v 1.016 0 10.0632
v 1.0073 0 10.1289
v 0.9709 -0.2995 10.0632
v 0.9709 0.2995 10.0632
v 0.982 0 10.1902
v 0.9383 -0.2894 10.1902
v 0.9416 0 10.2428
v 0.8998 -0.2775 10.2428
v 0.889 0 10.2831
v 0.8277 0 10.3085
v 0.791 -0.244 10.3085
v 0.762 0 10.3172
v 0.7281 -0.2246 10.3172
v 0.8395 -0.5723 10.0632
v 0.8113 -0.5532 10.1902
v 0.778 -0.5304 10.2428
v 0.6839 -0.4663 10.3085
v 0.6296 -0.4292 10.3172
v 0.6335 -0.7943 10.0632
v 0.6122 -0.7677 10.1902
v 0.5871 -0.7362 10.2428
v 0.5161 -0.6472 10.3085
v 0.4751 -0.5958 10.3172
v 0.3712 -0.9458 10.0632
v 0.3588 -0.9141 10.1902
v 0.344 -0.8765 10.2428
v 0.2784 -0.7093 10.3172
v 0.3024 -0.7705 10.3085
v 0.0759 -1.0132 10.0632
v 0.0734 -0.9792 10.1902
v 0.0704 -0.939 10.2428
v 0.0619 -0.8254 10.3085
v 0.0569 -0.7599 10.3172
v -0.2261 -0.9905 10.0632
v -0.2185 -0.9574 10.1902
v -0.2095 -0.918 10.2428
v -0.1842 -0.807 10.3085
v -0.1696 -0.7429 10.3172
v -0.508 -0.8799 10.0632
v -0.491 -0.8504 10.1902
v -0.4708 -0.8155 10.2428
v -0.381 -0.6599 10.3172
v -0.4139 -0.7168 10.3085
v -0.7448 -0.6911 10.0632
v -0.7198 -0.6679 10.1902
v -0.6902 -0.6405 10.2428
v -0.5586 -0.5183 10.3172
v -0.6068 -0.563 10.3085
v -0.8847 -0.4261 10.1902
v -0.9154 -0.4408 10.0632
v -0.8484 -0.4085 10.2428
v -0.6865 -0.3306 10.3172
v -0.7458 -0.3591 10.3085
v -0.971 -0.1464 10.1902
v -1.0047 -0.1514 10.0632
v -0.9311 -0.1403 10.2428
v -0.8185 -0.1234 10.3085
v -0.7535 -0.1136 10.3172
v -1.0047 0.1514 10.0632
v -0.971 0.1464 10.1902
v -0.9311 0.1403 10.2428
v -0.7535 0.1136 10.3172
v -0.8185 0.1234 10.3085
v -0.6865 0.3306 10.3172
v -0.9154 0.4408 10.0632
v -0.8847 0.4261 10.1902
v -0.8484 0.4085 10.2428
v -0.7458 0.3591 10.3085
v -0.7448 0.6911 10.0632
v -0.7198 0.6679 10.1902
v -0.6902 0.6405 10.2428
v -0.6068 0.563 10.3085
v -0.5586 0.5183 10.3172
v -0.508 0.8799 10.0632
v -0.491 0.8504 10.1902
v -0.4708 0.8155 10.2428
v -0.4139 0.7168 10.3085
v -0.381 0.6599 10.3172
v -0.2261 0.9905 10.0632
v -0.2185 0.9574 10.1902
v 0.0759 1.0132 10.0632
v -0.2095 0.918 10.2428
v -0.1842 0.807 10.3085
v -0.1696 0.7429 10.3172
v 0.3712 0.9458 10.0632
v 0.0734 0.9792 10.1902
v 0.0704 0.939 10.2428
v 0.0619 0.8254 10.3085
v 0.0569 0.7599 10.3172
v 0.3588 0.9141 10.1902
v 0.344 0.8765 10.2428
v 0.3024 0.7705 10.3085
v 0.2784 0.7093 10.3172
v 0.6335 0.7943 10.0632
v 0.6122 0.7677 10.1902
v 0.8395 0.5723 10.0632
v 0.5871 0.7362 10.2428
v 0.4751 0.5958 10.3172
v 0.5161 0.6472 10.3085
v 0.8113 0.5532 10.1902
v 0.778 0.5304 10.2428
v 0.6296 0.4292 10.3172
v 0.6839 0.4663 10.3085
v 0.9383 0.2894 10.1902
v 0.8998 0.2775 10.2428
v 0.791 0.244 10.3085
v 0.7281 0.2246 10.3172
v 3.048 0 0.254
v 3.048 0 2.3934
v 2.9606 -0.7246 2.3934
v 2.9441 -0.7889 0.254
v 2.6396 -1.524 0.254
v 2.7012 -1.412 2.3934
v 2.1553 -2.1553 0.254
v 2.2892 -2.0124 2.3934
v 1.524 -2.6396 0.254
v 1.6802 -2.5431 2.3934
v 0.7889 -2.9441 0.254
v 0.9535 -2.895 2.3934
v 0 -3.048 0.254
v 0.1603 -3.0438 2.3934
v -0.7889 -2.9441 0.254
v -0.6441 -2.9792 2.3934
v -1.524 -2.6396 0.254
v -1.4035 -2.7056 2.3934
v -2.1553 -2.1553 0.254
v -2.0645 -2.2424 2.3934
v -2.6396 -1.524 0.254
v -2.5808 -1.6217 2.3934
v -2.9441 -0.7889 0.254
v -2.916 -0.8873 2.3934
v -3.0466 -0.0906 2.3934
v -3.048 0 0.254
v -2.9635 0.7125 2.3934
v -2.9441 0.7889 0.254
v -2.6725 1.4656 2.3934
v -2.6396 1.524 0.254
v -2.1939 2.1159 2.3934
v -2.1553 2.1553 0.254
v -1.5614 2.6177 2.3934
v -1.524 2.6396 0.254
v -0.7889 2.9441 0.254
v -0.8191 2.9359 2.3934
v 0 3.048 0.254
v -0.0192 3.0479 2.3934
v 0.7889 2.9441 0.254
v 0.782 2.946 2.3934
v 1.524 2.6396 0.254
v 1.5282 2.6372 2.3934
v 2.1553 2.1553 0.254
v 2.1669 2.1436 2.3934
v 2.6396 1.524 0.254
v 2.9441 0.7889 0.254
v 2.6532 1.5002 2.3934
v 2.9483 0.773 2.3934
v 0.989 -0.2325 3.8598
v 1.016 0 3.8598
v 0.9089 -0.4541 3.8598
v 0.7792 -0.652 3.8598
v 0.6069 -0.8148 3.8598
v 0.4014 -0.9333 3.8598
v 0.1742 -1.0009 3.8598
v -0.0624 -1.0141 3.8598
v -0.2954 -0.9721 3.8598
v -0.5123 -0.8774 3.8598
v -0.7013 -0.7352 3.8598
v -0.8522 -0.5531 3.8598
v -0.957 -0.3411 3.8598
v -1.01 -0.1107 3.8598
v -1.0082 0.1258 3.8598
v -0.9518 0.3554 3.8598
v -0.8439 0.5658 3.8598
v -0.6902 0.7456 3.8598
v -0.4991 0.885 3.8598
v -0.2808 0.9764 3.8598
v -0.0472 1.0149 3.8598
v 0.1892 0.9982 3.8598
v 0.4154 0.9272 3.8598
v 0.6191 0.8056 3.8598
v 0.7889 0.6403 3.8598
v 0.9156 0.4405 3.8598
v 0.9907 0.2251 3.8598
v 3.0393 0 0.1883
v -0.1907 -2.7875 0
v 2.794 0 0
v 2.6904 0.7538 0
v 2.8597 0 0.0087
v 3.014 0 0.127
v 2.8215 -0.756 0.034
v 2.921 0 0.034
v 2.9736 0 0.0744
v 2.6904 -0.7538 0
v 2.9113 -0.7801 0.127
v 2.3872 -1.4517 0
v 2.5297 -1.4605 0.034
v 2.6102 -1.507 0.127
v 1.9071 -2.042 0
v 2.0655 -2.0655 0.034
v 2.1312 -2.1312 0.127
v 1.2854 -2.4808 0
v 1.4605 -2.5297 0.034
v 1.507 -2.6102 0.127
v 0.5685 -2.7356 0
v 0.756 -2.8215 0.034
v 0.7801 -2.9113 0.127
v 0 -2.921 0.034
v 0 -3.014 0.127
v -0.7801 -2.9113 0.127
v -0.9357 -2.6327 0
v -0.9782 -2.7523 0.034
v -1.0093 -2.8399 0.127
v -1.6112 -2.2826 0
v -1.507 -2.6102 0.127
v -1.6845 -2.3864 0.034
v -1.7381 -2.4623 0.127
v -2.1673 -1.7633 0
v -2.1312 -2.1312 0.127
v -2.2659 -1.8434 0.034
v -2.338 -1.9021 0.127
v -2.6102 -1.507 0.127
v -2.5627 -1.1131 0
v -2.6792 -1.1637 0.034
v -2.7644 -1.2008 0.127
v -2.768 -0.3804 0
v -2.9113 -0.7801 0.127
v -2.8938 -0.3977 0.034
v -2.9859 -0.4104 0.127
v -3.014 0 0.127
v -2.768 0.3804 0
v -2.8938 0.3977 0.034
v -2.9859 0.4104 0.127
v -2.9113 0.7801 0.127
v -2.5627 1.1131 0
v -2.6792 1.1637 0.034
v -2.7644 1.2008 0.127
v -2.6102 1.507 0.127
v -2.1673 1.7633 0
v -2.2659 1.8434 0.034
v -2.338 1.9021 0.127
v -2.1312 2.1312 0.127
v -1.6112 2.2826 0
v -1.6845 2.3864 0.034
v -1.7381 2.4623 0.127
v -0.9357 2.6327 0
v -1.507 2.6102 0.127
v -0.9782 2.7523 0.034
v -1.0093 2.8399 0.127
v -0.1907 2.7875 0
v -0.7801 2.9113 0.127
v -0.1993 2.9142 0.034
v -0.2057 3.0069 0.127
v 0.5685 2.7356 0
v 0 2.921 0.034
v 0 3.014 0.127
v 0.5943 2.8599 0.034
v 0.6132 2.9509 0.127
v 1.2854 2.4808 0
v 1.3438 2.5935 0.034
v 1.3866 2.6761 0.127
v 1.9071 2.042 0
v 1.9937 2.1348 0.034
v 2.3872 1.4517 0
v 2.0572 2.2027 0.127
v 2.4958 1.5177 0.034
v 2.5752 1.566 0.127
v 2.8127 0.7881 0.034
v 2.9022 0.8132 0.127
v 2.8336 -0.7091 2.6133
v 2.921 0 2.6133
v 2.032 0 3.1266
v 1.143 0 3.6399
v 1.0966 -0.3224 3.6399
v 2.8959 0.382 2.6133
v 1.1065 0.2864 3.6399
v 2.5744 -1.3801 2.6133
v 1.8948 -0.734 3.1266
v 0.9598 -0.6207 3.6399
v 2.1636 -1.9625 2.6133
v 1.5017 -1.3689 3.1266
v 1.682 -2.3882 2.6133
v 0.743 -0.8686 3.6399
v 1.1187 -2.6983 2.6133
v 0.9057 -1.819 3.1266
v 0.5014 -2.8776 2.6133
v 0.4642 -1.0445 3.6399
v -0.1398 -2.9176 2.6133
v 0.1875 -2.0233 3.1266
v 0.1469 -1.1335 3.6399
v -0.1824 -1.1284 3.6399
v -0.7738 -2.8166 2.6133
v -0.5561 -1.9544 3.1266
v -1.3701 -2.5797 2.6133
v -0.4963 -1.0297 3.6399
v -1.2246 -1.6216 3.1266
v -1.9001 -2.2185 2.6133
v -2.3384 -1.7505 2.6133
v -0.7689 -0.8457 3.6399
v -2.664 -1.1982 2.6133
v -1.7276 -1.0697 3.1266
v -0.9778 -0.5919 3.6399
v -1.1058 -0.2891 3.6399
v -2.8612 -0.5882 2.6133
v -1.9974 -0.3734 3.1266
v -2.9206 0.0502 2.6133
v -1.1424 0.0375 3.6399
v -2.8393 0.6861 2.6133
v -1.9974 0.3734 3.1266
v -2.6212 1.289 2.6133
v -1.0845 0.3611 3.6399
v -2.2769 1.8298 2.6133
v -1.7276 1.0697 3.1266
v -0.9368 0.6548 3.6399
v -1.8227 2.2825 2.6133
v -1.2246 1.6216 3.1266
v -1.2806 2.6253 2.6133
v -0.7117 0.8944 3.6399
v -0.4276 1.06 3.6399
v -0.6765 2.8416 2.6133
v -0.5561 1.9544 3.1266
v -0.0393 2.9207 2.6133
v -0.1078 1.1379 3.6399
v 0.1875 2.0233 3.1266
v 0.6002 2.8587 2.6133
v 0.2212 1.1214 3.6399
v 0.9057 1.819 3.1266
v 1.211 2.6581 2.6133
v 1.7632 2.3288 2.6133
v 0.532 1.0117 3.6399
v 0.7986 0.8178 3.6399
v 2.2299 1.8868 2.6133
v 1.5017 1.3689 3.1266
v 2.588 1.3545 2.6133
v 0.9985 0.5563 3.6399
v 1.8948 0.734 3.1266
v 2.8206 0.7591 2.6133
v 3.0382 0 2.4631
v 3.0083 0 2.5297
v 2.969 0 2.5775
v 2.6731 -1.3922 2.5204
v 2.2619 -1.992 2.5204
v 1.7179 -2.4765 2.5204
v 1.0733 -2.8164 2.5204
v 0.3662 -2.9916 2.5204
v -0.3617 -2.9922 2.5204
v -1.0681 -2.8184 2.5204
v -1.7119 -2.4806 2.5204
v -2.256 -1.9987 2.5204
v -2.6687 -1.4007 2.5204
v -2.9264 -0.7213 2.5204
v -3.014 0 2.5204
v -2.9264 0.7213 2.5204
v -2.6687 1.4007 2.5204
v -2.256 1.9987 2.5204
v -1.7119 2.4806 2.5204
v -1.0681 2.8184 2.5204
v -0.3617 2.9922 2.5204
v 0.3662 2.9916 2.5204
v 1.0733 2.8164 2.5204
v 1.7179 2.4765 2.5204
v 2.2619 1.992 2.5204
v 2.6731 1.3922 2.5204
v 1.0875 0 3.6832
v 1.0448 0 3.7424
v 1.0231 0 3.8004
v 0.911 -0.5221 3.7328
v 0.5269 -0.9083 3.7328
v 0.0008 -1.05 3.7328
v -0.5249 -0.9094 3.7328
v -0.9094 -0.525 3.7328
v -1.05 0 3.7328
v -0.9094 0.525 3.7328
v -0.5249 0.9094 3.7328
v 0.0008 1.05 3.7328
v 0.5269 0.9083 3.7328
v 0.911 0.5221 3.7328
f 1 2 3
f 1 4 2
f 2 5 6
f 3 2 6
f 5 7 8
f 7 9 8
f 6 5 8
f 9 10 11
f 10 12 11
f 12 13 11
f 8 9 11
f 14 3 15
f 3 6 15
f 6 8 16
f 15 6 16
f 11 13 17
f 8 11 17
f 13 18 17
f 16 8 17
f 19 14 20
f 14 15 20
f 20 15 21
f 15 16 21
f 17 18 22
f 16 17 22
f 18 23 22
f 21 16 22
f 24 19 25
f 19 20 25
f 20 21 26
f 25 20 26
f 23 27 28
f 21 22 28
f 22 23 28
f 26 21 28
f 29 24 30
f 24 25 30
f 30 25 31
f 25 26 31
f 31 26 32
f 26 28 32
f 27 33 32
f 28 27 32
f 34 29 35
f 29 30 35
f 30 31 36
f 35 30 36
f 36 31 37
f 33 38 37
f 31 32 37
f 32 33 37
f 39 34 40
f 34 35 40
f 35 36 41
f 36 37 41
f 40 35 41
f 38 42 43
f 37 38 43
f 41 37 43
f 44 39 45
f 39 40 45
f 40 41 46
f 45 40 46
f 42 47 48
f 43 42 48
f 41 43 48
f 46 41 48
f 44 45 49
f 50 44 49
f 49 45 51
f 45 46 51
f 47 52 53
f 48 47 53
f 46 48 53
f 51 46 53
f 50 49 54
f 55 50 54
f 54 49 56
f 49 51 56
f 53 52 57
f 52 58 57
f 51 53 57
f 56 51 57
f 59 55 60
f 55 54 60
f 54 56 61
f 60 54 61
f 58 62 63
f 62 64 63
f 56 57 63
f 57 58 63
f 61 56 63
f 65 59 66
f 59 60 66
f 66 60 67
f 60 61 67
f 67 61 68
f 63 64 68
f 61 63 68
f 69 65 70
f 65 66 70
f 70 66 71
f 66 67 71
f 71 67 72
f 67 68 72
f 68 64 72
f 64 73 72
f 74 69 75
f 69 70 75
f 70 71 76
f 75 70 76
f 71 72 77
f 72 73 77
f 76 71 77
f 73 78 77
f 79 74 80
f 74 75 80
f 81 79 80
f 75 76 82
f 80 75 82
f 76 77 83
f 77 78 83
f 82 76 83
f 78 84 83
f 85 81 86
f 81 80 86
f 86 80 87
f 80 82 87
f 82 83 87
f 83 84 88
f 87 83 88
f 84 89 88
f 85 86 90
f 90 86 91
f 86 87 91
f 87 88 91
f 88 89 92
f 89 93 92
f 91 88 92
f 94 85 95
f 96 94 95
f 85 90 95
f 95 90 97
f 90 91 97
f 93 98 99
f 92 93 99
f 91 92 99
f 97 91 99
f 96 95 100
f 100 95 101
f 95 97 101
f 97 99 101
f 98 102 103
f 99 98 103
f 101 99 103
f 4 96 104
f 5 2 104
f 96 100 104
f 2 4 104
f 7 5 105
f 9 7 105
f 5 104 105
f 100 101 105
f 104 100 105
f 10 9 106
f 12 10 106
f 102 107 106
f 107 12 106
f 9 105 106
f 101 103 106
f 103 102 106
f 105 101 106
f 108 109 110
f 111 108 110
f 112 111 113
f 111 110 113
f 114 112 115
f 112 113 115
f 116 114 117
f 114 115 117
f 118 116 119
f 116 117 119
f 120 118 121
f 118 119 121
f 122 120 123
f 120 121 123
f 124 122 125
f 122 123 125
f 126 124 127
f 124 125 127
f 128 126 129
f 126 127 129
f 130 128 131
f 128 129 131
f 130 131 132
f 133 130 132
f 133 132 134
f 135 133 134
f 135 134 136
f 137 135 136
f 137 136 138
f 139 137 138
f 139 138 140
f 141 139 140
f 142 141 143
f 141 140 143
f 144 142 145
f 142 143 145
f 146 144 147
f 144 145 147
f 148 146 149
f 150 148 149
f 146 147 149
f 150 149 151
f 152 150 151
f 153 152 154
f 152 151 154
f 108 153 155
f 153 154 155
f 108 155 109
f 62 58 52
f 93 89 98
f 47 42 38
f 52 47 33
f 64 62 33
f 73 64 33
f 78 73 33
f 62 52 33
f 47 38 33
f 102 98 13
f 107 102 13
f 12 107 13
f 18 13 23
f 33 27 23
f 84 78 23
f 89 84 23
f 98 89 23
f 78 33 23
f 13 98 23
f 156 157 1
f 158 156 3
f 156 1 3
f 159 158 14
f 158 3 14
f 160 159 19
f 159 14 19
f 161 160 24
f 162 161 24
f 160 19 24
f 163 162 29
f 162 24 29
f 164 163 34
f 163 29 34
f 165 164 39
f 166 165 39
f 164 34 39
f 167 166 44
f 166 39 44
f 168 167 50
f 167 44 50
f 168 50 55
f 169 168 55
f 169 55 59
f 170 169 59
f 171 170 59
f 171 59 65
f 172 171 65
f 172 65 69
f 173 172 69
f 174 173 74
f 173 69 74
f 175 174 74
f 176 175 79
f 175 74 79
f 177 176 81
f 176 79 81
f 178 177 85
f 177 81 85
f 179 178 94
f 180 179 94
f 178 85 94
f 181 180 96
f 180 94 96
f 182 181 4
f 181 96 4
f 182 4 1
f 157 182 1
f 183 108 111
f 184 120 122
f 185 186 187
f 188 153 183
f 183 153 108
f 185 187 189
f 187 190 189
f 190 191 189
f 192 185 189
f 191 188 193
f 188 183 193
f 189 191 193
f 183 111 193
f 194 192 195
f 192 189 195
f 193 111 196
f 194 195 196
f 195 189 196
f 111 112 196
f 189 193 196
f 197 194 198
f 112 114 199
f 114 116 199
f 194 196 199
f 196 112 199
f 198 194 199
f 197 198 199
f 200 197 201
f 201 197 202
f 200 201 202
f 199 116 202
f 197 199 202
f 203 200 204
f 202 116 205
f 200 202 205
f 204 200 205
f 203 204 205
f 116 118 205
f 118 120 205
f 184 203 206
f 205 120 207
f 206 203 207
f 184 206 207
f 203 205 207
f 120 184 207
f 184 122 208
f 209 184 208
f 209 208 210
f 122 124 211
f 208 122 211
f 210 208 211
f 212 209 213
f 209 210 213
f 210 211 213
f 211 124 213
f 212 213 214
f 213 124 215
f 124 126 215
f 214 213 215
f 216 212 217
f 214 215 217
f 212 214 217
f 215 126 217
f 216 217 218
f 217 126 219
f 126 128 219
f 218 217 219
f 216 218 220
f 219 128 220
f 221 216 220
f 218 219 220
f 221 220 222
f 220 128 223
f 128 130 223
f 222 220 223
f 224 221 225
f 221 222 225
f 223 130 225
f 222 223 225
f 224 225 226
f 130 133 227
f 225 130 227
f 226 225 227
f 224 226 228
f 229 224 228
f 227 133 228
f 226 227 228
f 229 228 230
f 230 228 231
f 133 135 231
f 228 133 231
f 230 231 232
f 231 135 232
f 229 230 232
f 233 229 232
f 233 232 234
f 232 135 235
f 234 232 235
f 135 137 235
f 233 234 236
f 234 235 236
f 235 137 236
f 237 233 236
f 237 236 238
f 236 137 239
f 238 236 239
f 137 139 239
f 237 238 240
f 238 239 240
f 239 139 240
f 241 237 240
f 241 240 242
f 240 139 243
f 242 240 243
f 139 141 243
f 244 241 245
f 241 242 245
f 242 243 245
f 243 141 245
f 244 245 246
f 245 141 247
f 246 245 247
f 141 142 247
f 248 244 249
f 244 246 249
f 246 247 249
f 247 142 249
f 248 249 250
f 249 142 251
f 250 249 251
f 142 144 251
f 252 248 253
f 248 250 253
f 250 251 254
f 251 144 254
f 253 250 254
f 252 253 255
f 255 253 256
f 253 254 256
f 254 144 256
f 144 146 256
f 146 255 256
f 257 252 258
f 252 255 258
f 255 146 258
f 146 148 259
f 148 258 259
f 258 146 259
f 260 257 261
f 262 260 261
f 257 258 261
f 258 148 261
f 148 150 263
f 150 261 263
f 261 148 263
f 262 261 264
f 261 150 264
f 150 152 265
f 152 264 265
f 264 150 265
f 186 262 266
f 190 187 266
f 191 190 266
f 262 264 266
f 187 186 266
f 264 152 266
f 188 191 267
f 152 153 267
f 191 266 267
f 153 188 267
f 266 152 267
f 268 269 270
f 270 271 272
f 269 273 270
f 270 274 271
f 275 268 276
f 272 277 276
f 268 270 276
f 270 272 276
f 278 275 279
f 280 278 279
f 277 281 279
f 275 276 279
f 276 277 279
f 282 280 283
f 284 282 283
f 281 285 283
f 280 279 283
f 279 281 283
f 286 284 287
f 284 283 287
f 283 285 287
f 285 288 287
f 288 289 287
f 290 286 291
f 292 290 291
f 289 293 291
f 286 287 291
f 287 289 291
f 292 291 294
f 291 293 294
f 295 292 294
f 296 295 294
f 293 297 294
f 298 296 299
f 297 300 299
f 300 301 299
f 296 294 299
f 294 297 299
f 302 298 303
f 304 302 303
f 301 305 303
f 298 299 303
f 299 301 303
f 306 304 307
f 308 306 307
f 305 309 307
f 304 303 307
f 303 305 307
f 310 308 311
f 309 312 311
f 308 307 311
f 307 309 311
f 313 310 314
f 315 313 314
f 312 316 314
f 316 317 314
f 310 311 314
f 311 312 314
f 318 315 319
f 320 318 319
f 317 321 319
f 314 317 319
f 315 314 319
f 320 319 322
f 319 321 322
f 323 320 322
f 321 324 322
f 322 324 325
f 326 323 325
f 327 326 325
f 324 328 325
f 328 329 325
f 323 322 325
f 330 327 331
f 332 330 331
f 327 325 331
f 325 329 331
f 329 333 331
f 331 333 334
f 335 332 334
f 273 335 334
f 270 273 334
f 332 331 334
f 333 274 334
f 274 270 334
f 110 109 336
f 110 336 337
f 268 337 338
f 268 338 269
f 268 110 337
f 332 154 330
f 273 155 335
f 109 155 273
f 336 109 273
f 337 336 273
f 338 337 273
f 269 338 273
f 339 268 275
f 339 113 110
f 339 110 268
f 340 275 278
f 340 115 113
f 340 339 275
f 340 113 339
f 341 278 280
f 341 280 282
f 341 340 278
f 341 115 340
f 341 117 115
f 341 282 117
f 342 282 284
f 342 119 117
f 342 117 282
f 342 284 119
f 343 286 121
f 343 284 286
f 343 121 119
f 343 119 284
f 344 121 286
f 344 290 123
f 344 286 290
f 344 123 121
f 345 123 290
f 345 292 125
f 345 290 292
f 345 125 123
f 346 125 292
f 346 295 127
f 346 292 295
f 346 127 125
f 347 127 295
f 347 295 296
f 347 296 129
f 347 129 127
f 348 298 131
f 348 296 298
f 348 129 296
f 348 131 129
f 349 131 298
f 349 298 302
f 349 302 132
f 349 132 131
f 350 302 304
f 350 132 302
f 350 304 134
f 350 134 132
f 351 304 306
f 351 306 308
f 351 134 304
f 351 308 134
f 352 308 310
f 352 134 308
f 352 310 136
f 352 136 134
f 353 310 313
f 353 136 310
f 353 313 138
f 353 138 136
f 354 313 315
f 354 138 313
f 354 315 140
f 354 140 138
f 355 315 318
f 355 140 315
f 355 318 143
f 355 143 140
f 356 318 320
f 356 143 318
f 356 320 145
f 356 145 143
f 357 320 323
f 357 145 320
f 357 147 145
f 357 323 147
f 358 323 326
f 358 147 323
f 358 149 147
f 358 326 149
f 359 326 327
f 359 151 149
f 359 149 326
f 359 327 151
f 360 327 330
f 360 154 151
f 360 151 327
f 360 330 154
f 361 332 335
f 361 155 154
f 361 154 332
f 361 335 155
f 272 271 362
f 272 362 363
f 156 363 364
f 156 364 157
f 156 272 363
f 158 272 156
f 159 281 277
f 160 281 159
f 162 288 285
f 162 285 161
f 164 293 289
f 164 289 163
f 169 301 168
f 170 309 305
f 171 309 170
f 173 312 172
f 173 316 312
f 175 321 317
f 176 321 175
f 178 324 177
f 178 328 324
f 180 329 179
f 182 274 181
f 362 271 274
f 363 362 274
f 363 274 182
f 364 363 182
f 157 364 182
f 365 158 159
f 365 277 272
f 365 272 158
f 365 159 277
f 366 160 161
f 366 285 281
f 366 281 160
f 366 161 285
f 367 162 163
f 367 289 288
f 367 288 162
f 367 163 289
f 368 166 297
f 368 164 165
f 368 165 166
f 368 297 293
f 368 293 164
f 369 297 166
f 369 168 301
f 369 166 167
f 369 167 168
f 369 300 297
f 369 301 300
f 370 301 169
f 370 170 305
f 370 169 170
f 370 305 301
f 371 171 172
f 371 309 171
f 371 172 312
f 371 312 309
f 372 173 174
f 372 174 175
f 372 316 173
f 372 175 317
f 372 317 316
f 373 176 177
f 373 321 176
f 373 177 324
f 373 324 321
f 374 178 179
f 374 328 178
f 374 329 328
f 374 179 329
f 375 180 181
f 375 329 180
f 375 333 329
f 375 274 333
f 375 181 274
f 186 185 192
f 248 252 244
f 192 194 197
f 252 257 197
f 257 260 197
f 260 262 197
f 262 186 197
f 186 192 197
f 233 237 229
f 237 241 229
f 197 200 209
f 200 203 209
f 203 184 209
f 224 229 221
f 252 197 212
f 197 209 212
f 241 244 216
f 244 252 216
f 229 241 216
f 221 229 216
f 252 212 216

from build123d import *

# Parameters (mm, degrees)
FILLET1_R = 0.254


with BuildPart() as part:
    # Sketch1 → Revolve1 (revolve)
    with BuildSketch(Plane(origin=(0, 0, 0), x_dir=(1, 0, 0), z_dir=(0, 1, 0))):
        Polygon((0, 0), (3.048, 0), (3.048, -2.54), (1.016, -3.713175747), (1.016, -10.317175747), (0, -10.317175747), align=None)
    revolve(axis=Axis((0, 0, 10.317175747), (0, 0, -1)))

    # Fillet1
    fillet1_edges = [part.edges().sort_by_distance(p)[0] for p in [
        (-1.016, 0, 10.317175747),
        (-1.016, 0, 3.713175747),
        (-3.048, 0, 2.54),
        (-3.048, 0, 0),
    ]]
    fillet(fillet1_edges, radius=FILLET1_R)


solid = part.part
